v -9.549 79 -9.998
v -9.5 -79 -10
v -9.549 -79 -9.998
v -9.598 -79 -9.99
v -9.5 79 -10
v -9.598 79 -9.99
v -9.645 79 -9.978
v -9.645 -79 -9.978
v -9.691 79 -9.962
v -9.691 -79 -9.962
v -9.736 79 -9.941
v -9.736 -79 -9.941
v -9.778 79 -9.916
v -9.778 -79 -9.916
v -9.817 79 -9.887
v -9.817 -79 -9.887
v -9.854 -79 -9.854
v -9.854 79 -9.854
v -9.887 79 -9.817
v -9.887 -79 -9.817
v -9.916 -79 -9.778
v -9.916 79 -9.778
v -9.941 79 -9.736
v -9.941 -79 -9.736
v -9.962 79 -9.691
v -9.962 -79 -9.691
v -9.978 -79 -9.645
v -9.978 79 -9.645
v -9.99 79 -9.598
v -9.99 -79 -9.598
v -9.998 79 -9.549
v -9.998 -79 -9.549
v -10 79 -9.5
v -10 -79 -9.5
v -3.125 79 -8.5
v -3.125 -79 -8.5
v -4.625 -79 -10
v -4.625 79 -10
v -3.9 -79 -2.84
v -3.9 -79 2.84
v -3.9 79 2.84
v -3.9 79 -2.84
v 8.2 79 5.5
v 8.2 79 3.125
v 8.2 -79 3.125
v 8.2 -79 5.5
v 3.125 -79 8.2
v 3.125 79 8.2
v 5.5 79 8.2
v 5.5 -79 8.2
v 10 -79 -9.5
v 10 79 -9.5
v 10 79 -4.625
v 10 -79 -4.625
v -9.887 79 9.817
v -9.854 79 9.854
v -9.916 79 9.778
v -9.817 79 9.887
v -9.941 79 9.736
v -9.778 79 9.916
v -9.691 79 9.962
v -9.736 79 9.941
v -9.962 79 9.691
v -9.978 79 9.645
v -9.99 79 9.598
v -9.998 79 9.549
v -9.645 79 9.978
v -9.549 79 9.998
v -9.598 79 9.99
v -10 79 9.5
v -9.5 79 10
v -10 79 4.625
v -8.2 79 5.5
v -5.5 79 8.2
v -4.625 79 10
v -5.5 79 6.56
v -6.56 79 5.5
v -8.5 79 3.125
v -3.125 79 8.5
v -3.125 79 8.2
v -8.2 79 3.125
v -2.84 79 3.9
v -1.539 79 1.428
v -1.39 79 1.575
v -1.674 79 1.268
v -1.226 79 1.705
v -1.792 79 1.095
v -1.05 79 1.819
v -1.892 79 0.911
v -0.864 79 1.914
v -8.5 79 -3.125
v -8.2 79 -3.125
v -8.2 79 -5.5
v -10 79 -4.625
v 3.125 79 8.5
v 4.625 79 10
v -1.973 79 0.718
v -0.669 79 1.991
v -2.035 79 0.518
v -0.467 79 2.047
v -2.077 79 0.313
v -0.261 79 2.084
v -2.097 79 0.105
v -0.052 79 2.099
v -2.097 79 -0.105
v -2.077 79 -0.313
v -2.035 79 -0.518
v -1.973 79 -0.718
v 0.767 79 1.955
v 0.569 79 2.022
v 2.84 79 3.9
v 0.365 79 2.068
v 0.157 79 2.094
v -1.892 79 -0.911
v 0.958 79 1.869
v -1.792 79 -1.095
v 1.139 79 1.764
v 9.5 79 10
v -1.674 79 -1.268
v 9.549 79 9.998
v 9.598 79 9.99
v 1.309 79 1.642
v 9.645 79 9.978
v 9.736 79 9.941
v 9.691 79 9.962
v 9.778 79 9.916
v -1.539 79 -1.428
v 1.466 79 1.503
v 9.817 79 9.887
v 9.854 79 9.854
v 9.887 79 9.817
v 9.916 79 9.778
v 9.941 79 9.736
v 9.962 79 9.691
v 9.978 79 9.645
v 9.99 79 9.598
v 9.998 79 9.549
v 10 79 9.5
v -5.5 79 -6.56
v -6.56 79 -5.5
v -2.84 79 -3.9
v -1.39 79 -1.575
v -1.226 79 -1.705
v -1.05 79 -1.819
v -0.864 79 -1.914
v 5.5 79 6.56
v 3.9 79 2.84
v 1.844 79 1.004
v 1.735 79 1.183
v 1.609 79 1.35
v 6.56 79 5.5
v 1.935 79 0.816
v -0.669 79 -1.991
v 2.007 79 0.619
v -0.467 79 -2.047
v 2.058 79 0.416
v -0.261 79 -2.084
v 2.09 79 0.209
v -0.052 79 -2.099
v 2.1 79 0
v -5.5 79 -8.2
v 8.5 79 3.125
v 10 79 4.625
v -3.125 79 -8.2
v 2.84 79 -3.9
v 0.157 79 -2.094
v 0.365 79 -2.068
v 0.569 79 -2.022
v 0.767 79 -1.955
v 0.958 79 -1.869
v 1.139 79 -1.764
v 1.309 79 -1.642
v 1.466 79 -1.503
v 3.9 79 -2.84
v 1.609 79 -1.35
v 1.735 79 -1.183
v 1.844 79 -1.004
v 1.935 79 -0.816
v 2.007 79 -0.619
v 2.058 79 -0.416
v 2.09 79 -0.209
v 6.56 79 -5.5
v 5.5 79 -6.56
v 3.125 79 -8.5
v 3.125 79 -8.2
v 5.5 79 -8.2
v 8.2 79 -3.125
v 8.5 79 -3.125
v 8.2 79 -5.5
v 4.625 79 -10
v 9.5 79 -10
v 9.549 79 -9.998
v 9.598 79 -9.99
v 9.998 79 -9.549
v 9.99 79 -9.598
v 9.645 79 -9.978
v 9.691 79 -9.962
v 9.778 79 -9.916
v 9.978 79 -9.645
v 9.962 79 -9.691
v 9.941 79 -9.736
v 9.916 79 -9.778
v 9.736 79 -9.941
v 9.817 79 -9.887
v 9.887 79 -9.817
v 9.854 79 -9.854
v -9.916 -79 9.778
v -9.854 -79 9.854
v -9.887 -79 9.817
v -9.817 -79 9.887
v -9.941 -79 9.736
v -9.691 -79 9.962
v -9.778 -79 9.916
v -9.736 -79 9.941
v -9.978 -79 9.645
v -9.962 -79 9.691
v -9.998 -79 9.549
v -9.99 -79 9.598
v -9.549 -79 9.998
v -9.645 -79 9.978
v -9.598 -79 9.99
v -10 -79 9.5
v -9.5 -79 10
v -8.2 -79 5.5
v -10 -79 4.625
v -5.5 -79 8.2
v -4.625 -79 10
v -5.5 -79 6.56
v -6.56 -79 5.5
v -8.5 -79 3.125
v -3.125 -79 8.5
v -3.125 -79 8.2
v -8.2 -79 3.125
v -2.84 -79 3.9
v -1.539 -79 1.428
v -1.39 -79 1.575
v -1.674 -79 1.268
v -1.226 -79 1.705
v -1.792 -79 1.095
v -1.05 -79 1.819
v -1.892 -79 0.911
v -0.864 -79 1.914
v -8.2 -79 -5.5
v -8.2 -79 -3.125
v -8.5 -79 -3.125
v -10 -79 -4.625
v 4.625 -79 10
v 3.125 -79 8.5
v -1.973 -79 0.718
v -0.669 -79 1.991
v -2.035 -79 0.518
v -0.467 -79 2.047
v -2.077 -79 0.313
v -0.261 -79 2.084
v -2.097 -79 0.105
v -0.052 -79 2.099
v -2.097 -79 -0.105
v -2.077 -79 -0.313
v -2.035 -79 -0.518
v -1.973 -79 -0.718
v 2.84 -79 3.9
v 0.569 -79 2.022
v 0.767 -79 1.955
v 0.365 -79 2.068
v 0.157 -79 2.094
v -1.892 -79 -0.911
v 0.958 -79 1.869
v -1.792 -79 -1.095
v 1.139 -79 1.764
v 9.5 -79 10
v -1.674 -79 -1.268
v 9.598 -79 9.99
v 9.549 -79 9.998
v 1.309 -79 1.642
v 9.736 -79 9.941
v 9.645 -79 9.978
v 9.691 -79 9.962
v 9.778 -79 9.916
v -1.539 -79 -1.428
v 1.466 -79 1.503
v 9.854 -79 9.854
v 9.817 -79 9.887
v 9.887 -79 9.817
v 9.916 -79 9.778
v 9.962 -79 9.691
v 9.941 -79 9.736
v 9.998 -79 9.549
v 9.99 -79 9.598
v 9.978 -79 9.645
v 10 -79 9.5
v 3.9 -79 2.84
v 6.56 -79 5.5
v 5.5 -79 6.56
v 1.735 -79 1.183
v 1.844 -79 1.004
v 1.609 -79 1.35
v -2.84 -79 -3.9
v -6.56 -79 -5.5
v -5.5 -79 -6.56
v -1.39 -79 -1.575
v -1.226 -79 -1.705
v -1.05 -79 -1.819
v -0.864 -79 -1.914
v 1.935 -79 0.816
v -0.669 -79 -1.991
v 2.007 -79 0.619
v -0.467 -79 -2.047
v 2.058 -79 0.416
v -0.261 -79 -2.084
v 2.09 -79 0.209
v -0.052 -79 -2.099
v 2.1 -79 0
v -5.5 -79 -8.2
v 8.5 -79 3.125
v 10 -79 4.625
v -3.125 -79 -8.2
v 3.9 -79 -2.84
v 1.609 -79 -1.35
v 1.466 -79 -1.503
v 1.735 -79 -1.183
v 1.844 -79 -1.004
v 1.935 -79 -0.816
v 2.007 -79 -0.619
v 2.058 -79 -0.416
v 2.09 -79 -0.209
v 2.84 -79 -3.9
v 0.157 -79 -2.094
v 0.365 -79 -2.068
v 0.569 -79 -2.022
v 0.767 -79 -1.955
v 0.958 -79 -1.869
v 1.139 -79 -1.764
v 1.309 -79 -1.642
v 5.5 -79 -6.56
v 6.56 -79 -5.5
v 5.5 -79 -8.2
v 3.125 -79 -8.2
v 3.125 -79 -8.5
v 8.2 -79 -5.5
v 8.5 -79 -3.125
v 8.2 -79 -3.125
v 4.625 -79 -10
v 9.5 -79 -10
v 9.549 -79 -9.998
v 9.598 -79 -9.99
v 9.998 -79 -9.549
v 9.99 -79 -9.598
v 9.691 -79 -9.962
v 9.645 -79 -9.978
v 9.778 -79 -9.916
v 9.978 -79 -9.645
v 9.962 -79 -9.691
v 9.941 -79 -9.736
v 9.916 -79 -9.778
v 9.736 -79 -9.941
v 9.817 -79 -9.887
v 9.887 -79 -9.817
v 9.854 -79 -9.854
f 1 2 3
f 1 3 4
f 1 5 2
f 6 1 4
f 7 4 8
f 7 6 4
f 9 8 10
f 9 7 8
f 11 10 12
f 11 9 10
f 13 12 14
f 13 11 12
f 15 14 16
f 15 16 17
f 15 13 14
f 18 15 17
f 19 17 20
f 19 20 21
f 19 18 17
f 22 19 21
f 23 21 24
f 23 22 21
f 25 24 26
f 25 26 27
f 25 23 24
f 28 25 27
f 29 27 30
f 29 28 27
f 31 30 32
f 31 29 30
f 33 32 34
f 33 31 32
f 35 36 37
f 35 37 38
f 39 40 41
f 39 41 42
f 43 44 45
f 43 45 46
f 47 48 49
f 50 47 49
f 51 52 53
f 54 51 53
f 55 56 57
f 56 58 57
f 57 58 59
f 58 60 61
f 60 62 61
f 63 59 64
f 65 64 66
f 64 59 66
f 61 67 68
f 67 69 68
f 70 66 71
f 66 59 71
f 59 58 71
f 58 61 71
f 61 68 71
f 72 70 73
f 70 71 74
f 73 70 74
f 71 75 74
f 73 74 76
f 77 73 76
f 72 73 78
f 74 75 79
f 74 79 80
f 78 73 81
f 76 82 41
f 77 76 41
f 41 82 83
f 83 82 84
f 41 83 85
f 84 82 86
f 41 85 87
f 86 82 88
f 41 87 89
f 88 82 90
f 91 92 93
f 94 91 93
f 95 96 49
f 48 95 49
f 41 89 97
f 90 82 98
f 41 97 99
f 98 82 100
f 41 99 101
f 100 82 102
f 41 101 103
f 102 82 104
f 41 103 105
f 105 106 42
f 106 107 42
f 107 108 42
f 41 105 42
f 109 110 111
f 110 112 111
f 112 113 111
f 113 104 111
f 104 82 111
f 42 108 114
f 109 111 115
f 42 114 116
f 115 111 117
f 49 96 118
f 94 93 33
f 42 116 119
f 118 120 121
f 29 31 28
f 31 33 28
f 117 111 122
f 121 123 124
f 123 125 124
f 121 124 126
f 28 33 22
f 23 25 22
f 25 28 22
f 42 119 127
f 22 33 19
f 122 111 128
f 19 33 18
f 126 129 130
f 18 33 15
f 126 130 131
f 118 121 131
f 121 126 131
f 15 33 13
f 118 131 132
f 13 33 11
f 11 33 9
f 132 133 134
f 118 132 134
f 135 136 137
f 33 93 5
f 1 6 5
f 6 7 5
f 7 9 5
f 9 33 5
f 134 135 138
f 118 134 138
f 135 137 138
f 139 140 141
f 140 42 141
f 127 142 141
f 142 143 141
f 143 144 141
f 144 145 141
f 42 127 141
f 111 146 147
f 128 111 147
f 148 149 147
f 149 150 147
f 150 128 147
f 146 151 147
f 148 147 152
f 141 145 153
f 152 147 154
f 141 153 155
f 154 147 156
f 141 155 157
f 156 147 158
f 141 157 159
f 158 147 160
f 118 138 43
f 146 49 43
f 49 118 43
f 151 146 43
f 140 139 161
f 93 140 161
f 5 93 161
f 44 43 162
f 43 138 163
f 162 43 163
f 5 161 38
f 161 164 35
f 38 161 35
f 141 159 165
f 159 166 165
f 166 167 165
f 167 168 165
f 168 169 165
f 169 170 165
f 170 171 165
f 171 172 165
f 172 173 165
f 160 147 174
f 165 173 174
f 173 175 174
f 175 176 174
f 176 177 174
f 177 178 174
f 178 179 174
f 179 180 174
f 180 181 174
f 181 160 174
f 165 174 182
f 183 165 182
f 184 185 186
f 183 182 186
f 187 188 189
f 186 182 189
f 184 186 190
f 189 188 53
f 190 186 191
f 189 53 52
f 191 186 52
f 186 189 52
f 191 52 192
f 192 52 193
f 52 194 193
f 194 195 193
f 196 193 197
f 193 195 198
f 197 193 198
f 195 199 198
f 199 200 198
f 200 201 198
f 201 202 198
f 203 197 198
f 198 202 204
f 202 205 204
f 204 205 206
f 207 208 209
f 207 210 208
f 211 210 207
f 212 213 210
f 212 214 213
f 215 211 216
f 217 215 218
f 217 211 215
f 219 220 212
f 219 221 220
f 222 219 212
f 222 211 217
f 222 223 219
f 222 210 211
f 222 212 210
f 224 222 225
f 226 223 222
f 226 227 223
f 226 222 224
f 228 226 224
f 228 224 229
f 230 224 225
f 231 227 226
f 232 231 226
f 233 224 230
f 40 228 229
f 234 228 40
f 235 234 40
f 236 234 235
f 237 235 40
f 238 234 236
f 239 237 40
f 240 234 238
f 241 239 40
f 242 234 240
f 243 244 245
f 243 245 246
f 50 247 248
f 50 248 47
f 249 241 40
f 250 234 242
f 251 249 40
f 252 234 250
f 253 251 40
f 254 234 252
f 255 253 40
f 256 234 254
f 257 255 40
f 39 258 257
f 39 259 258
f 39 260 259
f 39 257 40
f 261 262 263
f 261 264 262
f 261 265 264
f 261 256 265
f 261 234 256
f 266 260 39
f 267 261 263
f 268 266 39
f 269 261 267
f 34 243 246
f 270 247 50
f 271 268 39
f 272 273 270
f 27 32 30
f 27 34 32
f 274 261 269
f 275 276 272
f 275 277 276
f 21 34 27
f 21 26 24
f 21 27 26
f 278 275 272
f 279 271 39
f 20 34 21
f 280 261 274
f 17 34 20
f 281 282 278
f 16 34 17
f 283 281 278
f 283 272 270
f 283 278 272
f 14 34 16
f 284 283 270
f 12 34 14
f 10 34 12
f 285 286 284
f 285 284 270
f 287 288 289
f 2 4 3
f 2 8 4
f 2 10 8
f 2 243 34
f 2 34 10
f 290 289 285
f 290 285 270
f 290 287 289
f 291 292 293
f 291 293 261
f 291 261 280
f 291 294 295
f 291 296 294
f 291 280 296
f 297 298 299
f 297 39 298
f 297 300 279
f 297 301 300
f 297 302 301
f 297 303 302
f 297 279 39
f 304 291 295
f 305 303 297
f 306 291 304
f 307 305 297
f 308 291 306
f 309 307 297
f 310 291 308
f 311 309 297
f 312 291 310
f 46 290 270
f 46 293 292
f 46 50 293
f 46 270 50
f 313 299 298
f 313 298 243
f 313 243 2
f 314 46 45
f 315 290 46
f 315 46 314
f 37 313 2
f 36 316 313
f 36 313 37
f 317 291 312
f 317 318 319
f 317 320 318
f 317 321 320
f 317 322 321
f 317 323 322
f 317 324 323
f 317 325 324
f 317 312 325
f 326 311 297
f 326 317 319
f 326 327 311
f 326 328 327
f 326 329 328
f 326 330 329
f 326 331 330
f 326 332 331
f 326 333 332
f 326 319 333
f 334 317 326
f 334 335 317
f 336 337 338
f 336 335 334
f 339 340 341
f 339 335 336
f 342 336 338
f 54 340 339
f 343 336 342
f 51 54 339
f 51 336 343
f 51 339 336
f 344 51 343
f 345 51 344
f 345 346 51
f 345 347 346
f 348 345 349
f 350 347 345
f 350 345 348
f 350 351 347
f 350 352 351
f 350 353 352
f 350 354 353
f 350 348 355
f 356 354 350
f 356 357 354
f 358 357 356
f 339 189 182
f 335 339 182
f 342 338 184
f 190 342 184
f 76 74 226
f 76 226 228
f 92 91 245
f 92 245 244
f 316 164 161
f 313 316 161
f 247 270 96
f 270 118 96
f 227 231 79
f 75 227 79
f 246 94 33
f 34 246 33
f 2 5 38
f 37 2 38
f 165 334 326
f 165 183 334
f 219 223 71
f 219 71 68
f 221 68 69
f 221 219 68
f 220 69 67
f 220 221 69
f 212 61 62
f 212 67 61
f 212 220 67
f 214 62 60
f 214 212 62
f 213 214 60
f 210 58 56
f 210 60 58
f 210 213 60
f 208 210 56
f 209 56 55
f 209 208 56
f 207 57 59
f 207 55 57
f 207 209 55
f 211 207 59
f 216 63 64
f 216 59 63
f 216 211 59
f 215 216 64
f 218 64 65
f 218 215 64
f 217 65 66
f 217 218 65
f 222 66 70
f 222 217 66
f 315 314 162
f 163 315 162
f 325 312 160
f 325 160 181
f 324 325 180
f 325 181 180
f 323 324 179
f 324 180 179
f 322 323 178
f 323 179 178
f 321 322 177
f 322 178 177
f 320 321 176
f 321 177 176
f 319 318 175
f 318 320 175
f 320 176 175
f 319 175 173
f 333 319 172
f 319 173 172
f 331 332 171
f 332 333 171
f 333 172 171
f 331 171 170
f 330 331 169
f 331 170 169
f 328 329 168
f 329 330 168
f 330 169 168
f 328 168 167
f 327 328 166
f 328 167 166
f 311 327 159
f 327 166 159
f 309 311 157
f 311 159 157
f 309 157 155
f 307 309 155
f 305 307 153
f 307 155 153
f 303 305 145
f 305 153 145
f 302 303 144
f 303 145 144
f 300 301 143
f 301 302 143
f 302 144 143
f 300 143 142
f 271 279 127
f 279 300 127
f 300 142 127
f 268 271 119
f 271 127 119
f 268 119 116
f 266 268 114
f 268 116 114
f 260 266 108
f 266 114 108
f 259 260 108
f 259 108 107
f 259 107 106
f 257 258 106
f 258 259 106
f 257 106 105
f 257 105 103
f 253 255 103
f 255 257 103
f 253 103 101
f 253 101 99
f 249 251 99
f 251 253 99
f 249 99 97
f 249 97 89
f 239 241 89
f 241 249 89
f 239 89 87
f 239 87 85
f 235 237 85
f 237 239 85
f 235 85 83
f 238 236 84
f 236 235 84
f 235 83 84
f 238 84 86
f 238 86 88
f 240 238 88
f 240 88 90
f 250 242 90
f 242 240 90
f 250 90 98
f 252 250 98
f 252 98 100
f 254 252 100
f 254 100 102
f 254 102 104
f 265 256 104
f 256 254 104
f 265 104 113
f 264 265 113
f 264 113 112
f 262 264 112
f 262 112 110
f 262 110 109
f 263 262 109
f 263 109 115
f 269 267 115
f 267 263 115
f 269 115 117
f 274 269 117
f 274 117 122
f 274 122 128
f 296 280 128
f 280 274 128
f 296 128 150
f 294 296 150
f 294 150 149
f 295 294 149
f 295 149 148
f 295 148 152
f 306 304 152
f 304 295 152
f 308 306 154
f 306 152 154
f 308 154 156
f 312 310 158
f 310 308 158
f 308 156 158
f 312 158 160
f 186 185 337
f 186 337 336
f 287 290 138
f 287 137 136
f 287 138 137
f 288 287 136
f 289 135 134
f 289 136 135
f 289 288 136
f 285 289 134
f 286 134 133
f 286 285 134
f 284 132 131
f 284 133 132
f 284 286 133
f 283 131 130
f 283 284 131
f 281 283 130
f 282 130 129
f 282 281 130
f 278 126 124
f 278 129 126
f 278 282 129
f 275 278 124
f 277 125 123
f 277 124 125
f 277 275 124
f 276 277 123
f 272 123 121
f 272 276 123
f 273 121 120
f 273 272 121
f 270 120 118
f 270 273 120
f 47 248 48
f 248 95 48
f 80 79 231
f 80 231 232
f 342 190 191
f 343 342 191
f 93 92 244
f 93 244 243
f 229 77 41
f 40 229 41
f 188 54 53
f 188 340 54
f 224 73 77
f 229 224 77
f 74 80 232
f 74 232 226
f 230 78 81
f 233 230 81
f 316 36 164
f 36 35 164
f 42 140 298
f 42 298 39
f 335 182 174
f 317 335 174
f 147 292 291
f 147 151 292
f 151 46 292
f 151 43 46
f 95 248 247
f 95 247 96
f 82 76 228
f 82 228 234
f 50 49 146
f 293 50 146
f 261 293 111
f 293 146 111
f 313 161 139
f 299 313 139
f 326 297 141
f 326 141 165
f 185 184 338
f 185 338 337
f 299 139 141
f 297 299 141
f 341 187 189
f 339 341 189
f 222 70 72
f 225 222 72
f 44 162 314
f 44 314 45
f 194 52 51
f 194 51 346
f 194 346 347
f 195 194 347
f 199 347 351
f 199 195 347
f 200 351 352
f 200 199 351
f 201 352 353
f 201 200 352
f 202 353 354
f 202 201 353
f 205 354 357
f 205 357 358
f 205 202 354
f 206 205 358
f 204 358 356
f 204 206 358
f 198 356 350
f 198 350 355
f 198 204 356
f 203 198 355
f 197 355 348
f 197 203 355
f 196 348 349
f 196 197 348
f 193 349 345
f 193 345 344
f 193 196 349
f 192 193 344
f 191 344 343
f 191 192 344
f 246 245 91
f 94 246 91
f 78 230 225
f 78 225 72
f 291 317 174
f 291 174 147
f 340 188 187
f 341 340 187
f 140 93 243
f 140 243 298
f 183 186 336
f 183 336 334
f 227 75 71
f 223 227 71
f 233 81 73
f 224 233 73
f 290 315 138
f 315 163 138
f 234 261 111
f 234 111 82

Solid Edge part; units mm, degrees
sketch "Sketch1" plane through (0, 0, 0) normal (0, -1, 0) x (1, 0, 0)
  line L0 (10, -10) -> (10, 10)
  line L1 (10, 10) -> (-10, 10)
  line L2 (-10, 10) -> (-10, -10)
  line L3 (-10, -10) -> (10, -10)
  circle A0 centre (0, 0) radius 2.1
  dimension "D1" = 1.64
  dimension "D2" = 1.8
  dimension "D3" = 20
  dimension "D4" = 20
  dimension "D5" = 3.9
  dimension "D6" = 6.25
  dimension "D7" = 11
extrude "Protrusion1" add sketch "Sketch1" along normal mid plane 158
sketch "Sketch2" plane through (0, 0, 0) normal (0, -1, 0) x (1, 0, 0)
  line L0 (5.5, 6.56) -> (2.84, 3.9)
  line L1 (2.84, 3.9) -> (-2.84, 3.9)
  line L2 (-5.5, 6.56) -> (-2.84, 3.9)
  line L3 (-5.5, 8.2) -> (-5.5, 6.56)
  line L4 (-3.125, 8.2) -> (-5.5, 8.2)
  line L5 (-3.125, 10) -> (-3.125, 8.2)
  line L6 (-3.125, 10) -> (3.125, 10)
  line L7 (3.125, 10) -> (3.125, 8.2)
  line L8 (3.125, 8.2) -> (5.5, 8.2)
  line L9 (5.5, 8.2) -> (5.5, 6.56)
extrude "Cutout1" cut sketch "Sketch2" along normal through all and the other way through all
chamfer "Chaflán_1" distance 1.5 angle 45 2 edges at (-3.125, 0, 10) (3.125, 0, 10)
pattern_circular "Pattern1" count 4 over 360 about axis through (0, -79, 0) along (0, 1, 0) of "Cutout1", "Chaflán_1"
fillet "Redondeo_3" radius 0.5 4 edges at (-10, 0, 10) (10, 0, 10) (10, 0, -10) (-10, 0, -10)
